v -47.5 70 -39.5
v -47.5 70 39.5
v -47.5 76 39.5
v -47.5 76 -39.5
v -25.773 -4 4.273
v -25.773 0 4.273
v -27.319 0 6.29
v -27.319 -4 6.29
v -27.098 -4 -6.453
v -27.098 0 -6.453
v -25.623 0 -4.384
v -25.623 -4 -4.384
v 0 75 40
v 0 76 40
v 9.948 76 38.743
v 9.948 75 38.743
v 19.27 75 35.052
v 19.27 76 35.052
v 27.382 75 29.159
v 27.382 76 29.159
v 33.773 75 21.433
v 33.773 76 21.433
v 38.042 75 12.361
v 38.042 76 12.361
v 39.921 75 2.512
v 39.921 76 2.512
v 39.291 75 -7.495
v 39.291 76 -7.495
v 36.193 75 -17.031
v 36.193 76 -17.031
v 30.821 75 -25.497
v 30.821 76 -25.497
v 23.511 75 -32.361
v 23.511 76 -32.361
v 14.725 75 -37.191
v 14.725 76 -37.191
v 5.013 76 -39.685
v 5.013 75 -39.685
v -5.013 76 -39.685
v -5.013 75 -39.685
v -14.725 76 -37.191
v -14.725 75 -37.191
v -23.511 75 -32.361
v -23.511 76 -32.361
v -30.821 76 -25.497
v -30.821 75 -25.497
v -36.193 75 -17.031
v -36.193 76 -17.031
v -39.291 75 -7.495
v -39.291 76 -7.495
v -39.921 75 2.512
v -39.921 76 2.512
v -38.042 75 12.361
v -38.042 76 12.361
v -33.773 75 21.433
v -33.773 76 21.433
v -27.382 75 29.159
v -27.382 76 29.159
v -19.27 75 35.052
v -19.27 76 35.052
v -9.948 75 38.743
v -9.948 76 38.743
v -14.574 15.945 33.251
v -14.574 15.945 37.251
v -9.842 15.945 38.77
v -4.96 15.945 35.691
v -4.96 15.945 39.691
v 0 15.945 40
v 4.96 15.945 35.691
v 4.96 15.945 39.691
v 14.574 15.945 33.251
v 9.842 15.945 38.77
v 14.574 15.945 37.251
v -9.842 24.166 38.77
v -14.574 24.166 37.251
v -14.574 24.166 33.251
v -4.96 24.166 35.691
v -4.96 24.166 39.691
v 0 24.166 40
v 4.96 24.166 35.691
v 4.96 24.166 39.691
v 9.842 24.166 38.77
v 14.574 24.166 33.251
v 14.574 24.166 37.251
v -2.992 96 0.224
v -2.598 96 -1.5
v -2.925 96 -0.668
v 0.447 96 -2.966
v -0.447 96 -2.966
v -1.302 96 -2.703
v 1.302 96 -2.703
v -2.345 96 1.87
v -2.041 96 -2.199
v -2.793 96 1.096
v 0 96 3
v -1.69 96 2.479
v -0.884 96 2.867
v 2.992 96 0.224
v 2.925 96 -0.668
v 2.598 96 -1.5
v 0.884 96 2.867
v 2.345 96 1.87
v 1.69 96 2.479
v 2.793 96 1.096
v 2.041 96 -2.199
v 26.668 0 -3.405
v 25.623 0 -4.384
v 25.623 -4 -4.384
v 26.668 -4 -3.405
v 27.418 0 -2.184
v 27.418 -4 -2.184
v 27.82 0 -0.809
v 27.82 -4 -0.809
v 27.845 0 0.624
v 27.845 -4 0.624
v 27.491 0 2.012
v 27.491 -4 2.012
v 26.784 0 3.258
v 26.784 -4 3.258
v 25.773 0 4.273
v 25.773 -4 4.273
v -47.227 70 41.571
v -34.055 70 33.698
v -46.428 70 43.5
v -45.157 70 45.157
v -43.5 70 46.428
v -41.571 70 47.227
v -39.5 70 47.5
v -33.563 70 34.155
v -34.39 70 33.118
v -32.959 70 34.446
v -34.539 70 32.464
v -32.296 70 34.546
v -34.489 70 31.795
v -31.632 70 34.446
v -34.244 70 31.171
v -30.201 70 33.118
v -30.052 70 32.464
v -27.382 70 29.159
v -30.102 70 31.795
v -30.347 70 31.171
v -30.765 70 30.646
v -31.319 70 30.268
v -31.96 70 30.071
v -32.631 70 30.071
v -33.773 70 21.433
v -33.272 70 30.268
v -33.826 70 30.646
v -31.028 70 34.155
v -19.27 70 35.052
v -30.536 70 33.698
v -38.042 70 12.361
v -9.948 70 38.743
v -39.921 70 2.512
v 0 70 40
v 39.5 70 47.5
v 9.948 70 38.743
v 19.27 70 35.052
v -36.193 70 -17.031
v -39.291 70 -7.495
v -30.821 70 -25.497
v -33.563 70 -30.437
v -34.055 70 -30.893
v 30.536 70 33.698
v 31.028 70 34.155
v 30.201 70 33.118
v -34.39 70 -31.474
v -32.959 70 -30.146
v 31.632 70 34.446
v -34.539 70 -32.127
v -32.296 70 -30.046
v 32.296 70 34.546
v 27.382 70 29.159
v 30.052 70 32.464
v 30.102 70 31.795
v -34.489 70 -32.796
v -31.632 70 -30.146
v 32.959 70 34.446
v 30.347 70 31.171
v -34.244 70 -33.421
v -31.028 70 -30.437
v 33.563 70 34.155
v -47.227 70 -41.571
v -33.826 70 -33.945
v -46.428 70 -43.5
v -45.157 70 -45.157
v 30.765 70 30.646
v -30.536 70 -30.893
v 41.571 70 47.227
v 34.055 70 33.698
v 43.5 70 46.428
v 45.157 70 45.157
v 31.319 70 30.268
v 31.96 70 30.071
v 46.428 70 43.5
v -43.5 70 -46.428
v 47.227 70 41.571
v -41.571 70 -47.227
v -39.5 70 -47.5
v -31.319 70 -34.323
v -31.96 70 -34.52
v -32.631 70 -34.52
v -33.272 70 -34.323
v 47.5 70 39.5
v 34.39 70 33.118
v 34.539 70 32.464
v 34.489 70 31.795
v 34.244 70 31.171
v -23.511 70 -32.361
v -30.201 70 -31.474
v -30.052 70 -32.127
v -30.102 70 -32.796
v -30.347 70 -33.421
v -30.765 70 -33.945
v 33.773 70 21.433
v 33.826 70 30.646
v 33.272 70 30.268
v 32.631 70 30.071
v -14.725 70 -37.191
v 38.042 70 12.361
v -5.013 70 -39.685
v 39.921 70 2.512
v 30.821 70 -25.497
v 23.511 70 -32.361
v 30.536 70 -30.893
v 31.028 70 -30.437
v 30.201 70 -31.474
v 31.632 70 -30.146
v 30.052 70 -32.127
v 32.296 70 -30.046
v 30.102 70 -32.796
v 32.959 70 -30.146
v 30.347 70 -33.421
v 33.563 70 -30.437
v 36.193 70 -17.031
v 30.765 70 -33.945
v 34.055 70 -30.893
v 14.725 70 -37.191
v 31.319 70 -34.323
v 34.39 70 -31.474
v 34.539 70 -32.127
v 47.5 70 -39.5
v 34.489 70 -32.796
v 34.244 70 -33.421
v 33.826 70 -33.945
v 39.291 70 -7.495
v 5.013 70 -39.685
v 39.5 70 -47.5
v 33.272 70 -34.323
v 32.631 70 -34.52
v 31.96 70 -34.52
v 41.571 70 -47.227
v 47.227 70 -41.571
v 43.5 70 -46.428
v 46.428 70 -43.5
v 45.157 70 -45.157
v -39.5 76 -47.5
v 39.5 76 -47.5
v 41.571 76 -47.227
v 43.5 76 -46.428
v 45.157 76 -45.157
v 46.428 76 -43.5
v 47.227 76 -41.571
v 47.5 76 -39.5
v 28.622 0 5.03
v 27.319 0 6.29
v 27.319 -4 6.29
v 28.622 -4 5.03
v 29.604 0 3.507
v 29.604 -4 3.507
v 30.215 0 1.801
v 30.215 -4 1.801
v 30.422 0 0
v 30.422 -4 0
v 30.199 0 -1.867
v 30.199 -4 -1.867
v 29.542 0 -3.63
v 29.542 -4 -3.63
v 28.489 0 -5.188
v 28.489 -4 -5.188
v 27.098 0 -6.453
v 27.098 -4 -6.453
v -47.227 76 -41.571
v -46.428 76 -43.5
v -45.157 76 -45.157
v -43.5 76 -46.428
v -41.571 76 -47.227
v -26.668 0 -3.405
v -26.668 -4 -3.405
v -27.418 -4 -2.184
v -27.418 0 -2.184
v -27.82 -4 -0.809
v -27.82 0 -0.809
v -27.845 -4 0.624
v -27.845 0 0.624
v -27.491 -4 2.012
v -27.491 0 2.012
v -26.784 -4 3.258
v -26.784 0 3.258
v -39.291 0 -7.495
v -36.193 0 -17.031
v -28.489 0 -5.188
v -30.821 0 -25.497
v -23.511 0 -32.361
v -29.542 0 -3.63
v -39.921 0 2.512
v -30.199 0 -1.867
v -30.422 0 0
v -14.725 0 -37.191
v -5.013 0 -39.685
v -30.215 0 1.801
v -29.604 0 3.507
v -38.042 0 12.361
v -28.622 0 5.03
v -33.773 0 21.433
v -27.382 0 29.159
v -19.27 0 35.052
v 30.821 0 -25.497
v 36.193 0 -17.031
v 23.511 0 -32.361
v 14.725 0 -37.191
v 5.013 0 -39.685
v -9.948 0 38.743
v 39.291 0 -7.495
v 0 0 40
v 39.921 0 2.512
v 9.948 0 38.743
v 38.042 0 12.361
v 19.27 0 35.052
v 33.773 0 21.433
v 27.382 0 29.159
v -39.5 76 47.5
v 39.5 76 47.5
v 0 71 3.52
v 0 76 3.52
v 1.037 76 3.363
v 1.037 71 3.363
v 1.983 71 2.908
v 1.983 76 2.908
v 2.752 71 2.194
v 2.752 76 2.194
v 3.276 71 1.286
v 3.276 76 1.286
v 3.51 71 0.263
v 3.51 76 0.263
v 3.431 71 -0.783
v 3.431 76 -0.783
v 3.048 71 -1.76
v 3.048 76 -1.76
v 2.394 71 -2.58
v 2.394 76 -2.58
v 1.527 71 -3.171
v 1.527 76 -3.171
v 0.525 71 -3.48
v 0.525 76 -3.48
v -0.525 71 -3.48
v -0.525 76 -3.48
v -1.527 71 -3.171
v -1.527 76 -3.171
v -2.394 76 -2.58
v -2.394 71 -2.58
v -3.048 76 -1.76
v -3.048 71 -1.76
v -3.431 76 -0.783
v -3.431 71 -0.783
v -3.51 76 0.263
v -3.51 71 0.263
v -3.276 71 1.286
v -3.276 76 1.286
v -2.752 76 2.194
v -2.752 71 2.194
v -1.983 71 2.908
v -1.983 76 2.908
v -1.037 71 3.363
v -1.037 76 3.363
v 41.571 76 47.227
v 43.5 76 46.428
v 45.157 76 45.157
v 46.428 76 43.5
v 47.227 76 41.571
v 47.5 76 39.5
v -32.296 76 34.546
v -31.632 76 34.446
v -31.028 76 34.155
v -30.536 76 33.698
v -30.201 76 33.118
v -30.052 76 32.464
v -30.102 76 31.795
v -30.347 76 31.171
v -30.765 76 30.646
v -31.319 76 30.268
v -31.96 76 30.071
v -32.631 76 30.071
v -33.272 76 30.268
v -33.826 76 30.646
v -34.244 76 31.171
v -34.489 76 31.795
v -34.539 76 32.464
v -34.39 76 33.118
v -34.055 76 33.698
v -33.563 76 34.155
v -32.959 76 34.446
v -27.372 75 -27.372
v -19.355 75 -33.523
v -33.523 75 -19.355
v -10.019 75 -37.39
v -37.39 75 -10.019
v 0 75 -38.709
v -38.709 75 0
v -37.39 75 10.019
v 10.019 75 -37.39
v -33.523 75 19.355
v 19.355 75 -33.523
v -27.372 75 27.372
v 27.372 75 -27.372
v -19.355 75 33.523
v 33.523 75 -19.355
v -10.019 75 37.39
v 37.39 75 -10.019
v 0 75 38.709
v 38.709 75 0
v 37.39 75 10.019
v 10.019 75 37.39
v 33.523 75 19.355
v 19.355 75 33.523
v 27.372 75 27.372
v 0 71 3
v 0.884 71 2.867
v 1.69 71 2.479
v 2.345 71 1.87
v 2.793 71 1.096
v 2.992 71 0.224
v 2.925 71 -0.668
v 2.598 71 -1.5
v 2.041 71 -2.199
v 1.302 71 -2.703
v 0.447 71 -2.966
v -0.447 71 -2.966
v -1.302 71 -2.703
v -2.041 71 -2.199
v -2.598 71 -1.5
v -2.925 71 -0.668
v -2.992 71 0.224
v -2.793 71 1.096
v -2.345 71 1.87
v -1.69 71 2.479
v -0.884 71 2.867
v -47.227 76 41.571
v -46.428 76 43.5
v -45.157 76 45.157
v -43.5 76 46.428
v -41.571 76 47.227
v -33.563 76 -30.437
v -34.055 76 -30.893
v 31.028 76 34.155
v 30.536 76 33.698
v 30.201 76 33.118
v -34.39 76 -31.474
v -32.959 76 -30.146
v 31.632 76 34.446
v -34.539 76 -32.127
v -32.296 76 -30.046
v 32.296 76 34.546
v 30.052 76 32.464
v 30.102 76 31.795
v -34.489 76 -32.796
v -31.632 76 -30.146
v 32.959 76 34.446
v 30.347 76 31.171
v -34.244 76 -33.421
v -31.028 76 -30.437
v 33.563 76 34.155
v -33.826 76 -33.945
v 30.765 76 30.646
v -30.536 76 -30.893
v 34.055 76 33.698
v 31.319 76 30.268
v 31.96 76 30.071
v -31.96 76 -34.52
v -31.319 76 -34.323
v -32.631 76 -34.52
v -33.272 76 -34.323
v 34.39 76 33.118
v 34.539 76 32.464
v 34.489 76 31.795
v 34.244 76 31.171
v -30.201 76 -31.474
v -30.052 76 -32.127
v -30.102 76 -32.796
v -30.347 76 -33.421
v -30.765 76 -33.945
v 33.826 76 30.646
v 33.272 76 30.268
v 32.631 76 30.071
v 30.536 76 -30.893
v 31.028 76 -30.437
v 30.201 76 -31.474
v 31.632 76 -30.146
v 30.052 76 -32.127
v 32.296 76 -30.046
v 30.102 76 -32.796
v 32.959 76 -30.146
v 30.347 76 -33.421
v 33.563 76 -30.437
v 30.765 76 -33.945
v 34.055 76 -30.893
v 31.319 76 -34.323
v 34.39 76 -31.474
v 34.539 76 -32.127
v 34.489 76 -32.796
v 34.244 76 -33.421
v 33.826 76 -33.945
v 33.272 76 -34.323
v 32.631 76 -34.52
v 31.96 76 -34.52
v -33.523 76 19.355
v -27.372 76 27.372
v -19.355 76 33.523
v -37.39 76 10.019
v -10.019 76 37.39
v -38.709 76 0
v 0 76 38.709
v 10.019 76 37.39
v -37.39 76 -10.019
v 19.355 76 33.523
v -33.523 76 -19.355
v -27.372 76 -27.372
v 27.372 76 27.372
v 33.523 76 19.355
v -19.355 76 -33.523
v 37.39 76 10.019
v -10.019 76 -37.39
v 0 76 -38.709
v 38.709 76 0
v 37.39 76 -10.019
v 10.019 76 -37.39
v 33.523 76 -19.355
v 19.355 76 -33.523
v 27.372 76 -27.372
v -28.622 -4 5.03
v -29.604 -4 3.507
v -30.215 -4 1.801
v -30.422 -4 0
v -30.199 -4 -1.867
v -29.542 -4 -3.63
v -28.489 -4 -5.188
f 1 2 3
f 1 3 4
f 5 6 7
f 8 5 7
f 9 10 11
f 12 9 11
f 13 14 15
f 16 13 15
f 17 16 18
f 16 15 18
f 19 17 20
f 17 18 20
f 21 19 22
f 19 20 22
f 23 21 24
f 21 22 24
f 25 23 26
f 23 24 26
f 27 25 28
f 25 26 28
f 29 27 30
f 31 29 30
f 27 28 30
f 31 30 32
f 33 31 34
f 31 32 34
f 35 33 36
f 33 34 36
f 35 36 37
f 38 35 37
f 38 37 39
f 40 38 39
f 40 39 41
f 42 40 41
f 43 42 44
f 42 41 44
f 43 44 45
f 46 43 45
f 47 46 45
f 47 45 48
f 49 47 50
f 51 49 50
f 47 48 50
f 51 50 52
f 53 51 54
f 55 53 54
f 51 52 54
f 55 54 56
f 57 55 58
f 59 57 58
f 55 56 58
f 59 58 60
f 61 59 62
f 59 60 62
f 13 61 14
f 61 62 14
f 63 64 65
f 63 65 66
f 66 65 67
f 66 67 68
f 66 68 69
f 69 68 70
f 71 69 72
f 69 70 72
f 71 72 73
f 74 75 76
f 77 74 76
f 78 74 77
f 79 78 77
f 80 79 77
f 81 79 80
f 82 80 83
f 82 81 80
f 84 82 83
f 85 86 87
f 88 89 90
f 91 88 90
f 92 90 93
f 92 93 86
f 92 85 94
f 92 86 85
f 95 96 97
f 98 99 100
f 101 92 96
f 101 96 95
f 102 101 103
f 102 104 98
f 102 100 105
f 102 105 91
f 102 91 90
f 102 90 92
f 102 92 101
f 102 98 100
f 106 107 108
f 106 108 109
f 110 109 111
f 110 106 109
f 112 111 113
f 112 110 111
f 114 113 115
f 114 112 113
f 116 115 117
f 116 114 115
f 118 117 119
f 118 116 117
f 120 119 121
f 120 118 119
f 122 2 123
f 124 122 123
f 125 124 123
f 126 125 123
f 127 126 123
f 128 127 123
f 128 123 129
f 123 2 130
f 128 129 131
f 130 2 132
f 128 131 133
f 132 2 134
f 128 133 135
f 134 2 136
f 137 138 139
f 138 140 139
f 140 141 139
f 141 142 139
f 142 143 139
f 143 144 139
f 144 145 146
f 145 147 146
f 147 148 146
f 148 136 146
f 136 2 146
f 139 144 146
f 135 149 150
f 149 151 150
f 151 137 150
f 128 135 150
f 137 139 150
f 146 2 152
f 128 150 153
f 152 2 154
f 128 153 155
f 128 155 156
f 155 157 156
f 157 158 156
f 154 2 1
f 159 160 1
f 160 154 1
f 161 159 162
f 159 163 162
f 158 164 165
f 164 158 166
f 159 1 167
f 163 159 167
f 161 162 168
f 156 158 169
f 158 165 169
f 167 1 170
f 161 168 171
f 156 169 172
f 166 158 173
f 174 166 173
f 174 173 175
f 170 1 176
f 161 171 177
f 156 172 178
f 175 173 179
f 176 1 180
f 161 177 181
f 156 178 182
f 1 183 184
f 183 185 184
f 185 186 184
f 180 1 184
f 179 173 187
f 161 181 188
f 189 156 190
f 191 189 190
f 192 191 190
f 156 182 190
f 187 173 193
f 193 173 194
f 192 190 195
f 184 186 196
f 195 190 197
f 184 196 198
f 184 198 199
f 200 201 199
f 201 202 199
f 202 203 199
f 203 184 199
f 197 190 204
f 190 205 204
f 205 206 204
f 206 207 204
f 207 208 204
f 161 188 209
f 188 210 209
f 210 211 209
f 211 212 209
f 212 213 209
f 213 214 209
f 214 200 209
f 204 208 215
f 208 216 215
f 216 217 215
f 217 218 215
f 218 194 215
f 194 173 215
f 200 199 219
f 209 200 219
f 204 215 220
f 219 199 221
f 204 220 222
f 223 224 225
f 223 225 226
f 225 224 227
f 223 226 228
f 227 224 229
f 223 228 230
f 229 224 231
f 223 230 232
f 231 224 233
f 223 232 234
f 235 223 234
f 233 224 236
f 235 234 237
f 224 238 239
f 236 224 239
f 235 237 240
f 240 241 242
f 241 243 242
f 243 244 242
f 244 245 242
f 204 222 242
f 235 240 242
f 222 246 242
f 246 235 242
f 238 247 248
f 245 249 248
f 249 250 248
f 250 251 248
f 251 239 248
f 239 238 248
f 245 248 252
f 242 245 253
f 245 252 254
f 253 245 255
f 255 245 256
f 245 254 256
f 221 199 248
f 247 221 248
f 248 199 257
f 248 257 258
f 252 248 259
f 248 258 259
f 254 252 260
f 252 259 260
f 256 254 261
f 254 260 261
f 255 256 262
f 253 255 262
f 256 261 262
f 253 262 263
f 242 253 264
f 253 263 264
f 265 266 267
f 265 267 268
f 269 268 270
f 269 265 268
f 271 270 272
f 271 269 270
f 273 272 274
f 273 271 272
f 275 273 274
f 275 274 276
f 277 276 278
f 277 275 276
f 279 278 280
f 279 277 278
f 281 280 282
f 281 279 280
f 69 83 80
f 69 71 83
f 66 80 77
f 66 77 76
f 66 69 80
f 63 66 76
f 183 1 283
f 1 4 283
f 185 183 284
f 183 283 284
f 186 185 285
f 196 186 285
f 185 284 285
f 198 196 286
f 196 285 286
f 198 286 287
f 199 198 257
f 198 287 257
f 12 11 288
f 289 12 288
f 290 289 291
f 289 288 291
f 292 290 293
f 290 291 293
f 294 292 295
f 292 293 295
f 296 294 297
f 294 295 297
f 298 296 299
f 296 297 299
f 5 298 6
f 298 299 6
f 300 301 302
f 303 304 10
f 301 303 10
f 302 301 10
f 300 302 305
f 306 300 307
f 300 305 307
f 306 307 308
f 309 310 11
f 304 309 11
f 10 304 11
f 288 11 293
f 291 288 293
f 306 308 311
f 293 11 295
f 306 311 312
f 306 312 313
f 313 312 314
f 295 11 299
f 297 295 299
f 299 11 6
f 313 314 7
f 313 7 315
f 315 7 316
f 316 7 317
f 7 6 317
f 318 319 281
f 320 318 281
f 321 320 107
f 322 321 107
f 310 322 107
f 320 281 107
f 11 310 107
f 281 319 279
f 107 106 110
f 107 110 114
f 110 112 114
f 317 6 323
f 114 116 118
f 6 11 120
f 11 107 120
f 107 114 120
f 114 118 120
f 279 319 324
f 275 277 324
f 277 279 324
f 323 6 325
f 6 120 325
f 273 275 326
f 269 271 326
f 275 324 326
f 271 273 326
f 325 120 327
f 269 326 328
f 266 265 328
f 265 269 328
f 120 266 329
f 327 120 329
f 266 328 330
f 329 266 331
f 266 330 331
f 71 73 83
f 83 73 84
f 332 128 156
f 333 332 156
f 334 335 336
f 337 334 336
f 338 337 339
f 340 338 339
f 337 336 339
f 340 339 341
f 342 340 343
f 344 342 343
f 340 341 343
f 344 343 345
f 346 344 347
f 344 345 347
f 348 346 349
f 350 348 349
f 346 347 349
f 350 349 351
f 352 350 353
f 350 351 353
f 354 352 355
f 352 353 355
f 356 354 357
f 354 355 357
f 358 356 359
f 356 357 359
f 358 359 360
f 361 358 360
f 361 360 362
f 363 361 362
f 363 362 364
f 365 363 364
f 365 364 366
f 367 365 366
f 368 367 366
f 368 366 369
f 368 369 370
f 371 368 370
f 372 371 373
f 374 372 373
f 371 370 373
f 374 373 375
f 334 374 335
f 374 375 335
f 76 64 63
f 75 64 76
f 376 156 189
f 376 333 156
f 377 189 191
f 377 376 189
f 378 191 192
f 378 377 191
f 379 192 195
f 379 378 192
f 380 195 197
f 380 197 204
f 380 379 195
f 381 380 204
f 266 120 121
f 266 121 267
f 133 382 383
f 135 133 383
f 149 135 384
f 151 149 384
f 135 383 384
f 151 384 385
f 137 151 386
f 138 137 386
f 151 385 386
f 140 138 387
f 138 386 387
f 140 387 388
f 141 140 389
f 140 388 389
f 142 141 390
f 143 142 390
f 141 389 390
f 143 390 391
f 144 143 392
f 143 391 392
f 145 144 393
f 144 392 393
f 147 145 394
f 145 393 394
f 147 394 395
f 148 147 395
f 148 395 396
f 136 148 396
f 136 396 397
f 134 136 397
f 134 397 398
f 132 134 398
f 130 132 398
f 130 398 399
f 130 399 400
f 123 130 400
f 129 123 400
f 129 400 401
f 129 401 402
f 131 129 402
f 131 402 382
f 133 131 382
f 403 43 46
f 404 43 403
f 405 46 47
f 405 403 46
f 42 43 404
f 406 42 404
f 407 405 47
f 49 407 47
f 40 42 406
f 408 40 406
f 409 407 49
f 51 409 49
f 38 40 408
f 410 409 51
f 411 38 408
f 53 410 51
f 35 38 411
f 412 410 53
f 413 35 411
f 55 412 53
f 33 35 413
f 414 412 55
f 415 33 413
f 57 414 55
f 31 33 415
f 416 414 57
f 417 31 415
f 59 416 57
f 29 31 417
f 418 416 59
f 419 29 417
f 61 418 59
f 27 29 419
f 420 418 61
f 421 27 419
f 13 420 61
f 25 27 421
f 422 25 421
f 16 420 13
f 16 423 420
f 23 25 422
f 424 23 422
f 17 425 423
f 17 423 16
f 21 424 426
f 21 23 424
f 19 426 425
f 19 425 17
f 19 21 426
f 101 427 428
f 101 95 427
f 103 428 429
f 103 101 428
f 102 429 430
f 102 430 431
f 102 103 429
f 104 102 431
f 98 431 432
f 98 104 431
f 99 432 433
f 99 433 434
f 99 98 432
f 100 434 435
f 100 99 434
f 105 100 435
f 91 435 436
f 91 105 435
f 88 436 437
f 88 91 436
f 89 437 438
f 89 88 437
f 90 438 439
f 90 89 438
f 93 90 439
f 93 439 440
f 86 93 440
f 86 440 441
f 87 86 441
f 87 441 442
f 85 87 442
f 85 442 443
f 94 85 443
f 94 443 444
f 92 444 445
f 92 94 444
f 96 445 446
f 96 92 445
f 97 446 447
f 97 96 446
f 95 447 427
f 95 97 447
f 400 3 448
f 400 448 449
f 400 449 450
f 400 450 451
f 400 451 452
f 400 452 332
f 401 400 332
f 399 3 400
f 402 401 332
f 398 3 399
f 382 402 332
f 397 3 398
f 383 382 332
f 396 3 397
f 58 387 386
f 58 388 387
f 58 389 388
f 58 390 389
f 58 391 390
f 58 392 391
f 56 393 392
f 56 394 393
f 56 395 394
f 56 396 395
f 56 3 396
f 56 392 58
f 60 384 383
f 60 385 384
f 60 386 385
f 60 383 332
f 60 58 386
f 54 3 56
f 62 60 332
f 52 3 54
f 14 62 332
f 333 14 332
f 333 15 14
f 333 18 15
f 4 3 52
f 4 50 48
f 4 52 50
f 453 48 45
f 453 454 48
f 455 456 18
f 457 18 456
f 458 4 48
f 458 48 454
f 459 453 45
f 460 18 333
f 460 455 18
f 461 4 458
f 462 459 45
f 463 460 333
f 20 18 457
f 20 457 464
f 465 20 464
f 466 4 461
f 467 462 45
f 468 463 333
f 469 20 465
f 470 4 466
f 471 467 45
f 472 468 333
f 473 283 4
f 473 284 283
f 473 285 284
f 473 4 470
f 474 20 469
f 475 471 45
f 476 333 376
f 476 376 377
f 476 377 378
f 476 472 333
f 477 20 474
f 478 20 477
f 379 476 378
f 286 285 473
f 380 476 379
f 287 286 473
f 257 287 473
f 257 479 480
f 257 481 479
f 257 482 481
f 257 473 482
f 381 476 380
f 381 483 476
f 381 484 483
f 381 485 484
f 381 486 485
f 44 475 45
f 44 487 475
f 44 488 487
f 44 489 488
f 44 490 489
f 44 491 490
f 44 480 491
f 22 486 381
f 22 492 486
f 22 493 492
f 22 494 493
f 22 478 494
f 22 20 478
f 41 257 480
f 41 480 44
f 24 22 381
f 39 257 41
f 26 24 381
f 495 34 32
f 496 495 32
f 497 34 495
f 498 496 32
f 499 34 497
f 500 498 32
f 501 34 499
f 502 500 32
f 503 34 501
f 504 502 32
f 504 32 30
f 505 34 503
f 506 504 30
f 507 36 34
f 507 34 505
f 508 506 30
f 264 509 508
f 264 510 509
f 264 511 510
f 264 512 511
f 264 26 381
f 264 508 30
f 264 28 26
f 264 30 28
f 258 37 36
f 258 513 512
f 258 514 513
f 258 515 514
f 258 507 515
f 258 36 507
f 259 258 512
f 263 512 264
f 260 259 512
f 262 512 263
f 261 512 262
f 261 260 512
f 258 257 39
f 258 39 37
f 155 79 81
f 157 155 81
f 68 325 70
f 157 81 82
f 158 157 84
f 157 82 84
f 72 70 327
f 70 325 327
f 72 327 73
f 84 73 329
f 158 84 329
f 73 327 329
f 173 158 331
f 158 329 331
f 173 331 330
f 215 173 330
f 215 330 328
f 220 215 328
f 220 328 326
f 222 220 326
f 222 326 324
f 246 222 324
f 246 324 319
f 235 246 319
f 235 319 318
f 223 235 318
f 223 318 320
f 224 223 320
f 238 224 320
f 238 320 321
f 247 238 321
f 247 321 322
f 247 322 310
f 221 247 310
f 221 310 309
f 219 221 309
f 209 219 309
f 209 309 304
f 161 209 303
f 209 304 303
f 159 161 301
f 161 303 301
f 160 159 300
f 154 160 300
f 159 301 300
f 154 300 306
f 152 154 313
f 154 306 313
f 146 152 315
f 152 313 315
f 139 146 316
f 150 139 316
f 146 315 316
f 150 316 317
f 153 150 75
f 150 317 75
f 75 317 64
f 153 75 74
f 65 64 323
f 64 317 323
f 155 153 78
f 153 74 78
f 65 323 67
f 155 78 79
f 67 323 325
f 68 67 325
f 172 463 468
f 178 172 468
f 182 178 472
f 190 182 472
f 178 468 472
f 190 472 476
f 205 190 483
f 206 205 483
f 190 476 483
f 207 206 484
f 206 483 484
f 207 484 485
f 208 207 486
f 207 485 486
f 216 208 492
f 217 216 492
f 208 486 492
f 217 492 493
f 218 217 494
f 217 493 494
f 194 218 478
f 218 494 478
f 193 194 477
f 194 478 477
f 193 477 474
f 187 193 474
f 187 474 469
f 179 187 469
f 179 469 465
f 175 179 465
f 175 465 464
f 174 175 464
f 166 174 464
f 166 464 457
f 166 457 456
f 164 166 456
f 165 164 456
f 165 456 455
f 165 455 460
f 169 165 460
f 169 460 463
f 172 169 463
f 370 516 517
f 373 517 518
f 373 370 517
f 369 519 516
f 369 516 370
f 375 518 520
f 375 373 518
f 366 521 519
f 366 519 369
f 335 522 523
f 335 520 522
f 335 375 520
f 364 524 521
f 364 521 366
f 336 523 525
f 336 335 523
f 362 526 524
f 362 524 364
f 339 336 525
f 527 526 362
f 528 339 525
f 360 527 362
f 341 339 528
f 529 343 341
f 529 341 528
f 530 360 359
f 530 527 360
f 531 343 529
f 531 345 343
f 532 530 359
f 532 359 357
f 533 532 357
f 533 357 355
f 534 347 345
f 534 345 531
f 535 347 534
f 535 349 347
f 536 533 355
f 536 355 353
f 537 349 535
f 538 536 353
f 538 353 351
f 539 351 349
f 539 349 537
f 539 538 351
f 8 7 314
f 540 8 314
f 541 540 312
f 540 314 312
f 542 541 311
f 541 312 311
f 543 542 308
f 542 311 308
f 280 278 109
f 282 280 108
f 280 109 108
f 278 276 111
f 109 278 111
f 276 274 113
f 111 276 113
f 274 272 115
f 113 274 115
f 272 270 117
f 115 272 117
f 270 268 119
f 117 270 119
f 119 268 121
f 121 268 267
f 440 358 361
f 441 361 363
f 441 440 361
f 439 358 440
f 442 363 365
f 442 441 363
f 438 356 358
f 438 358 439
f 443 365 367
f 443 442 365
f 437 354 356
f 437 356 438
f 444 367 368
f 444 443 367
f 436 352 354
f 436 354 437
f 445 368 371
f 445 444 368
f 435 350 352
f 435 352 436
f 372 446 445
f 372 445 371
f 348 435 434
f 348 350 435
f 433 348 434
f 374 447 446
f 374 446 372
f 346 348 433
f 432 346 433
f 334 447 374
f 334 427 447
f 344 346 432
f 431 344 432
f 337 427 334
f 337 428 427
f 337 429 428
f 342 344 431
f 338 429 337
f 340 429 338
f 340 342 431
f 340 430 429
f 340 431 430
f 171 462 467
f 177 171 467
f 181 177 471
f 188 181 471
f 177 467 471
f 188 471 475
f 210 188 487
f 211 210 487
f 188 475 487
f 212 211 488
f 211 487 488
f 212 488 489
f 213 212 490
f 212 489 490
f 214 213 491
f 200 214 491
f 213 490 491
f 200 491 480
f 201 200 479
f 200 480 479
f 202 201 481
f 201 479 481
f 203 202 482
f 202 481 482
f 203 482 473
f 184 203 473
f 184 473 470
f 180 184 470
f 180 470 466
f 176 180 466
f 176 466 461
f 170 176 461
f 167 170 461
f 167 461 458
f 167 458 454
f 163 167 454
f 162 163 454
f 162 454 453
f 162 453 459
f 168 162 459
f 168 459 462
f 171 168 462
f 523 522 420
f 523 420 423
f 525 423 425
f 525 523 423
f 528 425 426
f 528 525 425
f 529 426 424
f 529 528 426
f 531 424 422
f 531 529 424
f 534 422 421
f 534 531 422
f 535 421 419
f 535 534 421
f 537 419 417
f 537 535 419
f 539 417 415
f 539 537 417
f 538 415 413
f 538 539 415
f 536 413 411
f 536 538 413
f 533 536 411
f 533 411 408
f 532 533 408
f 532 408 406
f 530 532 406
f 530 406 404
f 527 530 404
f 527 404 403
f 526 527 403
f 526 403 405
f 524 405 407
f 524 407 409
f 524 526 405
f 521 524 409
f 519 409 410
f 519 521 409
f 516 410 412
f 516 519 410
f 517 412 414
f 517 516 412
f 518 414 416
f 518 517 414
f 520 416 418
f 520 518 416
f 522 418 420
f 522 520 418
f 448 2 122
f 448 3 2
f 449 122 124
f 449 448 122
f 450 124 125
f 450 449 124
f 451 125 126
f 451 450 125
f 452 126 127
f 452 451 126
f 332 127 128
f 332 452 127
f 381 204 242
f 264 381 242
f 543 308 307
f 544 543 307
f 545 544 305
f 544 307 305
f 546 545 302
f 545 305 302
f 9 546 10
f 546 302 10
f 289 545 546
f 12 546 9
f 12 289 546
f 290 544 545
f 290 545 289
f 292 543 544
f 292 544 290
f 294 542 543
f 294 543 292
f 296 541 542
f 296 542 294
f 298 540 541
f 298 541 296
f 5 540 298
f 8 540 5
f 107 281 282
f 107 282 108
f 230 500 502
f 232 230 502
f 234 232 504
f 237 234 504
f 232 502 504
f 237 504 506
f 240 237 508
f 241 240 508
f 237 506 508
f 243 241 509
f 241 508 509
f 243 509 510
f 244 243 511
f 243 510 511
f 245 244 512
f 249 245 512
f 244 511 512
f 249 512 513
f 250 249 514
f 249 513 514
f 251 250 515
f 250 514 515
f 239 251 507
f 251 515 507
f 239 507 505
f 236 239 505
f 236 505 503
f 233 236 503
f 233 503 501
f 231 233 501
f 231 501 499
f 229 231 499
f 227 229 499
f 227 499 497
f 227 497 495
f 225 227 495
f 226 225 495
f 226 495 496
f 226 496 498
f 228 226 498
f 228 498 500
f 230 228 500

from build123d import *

# Parameters (mm, degrees)
SKETCH1_R                 = 40
BOSS_EXTRUDE1_DEPTH       = 70
SKETCH2_W                 = 95
SKETCH2_H                 = 95
BOSS_EXTRUDE2_DEPTH       = 6
SKETCH3_R                 = 40
SKETCH3_R_2               = 38.709273032
CUT_EXTRUDE1_DEPTH        = 1
SKETCH4_R                 = 3
BOSS_EXTRUDE3_DEPTH       = 20
FILLET1_R                 = 8
SKETCH6_R                 = 3.519560707
SKETCH6_R_2               = 3
CUT_EXTRUDE3_DEPTH        = 5
CUT_EXTRUDE4_REACH        = 123.169
CUT_EXTRUDE4_START_RADIUS = 40
CUT_EXTRUDE4_END_RADIUS   = 40
SKETCH8_W                 = 29.147137568
SKETCH8_H                 = 8.22098752
BOSS_EXTRUDE5_DEPTH       = 4
SKETCH10_R                = 2.25
CUT_EXTRUDE5_DEPTH        = 34


with BuildPart() as part:
    # Sketch1 → Boss-Extrude1 (new body)
    with BuildSketch(Plane(origin=(0, 0, 0), x_dir=(1, 0, 0), z_dir=(0, 1, 0))):
        with Locations(Location((0, 0, 0), (0, 0, 270))):
            Circle(SKETCH1_R)
    extrude(amount=BOSS_EXTRUDE1_DEPTH)

    # Sketch2 → Boss-Extrude2 (add)
    with BuildSketch(Plane(origin=(0, 70, 0), x_dir=(1, 0, 0), z_dir=(0, 1, 0))):
        Rectangle(SKETCH2_W, SKETCH2_H)
    extrude(amount=BOSS_EXTRUDE2_DEPTH)

    # Sketch3 → Cut-Extrude1 (cut)
    with BuildSketch(Plane(origin=(0, 76, 0), x_dir=(1, 0, 0), z_dir=(0, 1, 0))):
        with Locations(Location((0, 0, 0), (0, 0, 270))):
            Circle(SKETCH3_R)
        with Locations(Location((0, 0, 0), (0, 0, 270))):
            Circle(SKETCH3_R_2, mode=Mode.SUBTRACT)
    extrude(amount=-CUT_EXTRUDE1_DEPTH, mode=Mode.SUBTRACT)

    # Sketch4 → Boss-Extrude3 (add)
    with BuildSketch(Plane(origin=(0, 76, 0), x_dir=(1, 0, 0), z_dir=(0, 1, 0))):
        with Locations(Location((0, 0, 0), (0, 0, 270))):
            Circle(SKETCH4_R)
    extrude(amount=BOSS_EXTRUDE3_DEPTH)

    # Fillet1
    fillet1_edges = [part.edges().sort_by_distance(p)[0] for p in [
        (47.5, 73, 47.5),
        (47.5, 73, -47.5),
        (-47.5, 73, -47.5),
        (-47.5, 73, 47.5),
    ]]
    fillet(fillet1_edges, radius=FILLET1_R)

    # Sketch6 → Cut-Extrude3 (cut)
    with BuildSketch(Plane(origin=(0, 76, 0), x_dir=(1, 0, 0), z_dir=(0, 1, 0))):
        with Locations(Location((0, 0, 0), (0, 0, 270))):
            Circle(SKETCH6_R)
        with Locations(Location((0, 0, 0), (0, 0, 270))):
            Circle(SKETCH6_R_2, mode=Mode.SUBTRACT)
    extrude(amount=-CUT_EXTRUDE3_DEPTH, mode=Mode.SUBTRACT)

    # Cut-Extrude4: from a cylinder face, 123.169 long prism both ways, kept between that surface and its translate by the depth
    cut_extrude4_start = Plane(origin=(0, 20.055809, 0), z_dir=(0, -1, 0)) * Cylinder(CUT_EXTRUDE4_START_RADIUS, 327.338, mode=Mode.PRIVATE)
    cut_extrude4_end = Plane(origin=(0, 20.055809, -4), z_dir=(0, -1, 0)) * Cylinder(CUT_EXTRUDE4_END_RADIUS, 327.338, mode=Mode.PRIVATE)
    # Sketch8 → Cut-Extrude4 (cut, from a surface)
    with BuildSketch(Plane.XY, mode=Mode.PRIVATE) as cut_extrude4_sk1:
        with Locations((0, 20.055809212)):
            Rectangle(SKETCH8_W, SKETCH8_H)
    cut_extrude4_tool1 = extrude(cut_extrude4_sk1.sketch, amount=CUT_EXTRUDE4_REACH, both=True, mode=Mode.PRIVATE)
    add(((cut_extrude4_tool1 & cut_extrude4_start) - cut_extrude4_end).solids().sort_by_distance((0, 20.055809, 35.250652))[0], mode=Mode.SUBTRACT)

    # Sketch9 → Boss-Extrude5 (add)
    with BuildSketch(Plane.XZ):
        with BuildLine():
            ThreePointArc((-25.622676251, -4.384366141), (-27.880429407, -0.093420807), (-25.772900348, 4.273269294))
            Line((-25.772900348, 4.273269294), (-27.319093183, 6.289872554))
            ThreePointArc((-27.319093183, 6.289872554), (-29.604344551, 3.506882349), (-30.422381519, 0))
            ThreePointArc((-30.422381519, 0), (-29.542433802, -3.629669529), (-27.097976665, -6.453397238))
            Line((-27.097976665, -6.453397238), (-25.622676251, -4.384366141))
        make_face()
    boss_extrude5 = extrude(amount=BOSS_EXTRUDE5_DEPTH)

    # Mirror1: Boss-Extrude5 across plane
    add(boss_extrude5.mirror(Plane(origin=(0, 0, 0), x_dir=(0, 0, 1), z_dir=(1, 0, 0))))

    # Sketch10 → Cut-Extrude5 (cut)
    with BuildSketch(Plane(origin=(0, 76, 0), x_dir=(1, 0, 0), z_dir=(0, 1, 0))):
        with Locations(Location((-32.295599691, 32.295599691, 0), (0, 0, 270))):
            Circle(SKETCH10_R)
        with Locations(Location((32.295599691, 32.295599691, 0), (0, 0, 270))):
            Circle(SKETCH10_R)
        with Locations(Location((32.295599691, -32.295599691, 0), (0, 0, 270))):
            Circle(SKETCH10_R)
        with Locations(Location((-32.295599691, -32.295599691, 0), (0, 0, 270))):
            Circle(SKETCH10_R)
    extrude(amount=-CUT_EXTRUDE5_DEPTH, mode=Mode.SUBTRACT)


solid = part.part
